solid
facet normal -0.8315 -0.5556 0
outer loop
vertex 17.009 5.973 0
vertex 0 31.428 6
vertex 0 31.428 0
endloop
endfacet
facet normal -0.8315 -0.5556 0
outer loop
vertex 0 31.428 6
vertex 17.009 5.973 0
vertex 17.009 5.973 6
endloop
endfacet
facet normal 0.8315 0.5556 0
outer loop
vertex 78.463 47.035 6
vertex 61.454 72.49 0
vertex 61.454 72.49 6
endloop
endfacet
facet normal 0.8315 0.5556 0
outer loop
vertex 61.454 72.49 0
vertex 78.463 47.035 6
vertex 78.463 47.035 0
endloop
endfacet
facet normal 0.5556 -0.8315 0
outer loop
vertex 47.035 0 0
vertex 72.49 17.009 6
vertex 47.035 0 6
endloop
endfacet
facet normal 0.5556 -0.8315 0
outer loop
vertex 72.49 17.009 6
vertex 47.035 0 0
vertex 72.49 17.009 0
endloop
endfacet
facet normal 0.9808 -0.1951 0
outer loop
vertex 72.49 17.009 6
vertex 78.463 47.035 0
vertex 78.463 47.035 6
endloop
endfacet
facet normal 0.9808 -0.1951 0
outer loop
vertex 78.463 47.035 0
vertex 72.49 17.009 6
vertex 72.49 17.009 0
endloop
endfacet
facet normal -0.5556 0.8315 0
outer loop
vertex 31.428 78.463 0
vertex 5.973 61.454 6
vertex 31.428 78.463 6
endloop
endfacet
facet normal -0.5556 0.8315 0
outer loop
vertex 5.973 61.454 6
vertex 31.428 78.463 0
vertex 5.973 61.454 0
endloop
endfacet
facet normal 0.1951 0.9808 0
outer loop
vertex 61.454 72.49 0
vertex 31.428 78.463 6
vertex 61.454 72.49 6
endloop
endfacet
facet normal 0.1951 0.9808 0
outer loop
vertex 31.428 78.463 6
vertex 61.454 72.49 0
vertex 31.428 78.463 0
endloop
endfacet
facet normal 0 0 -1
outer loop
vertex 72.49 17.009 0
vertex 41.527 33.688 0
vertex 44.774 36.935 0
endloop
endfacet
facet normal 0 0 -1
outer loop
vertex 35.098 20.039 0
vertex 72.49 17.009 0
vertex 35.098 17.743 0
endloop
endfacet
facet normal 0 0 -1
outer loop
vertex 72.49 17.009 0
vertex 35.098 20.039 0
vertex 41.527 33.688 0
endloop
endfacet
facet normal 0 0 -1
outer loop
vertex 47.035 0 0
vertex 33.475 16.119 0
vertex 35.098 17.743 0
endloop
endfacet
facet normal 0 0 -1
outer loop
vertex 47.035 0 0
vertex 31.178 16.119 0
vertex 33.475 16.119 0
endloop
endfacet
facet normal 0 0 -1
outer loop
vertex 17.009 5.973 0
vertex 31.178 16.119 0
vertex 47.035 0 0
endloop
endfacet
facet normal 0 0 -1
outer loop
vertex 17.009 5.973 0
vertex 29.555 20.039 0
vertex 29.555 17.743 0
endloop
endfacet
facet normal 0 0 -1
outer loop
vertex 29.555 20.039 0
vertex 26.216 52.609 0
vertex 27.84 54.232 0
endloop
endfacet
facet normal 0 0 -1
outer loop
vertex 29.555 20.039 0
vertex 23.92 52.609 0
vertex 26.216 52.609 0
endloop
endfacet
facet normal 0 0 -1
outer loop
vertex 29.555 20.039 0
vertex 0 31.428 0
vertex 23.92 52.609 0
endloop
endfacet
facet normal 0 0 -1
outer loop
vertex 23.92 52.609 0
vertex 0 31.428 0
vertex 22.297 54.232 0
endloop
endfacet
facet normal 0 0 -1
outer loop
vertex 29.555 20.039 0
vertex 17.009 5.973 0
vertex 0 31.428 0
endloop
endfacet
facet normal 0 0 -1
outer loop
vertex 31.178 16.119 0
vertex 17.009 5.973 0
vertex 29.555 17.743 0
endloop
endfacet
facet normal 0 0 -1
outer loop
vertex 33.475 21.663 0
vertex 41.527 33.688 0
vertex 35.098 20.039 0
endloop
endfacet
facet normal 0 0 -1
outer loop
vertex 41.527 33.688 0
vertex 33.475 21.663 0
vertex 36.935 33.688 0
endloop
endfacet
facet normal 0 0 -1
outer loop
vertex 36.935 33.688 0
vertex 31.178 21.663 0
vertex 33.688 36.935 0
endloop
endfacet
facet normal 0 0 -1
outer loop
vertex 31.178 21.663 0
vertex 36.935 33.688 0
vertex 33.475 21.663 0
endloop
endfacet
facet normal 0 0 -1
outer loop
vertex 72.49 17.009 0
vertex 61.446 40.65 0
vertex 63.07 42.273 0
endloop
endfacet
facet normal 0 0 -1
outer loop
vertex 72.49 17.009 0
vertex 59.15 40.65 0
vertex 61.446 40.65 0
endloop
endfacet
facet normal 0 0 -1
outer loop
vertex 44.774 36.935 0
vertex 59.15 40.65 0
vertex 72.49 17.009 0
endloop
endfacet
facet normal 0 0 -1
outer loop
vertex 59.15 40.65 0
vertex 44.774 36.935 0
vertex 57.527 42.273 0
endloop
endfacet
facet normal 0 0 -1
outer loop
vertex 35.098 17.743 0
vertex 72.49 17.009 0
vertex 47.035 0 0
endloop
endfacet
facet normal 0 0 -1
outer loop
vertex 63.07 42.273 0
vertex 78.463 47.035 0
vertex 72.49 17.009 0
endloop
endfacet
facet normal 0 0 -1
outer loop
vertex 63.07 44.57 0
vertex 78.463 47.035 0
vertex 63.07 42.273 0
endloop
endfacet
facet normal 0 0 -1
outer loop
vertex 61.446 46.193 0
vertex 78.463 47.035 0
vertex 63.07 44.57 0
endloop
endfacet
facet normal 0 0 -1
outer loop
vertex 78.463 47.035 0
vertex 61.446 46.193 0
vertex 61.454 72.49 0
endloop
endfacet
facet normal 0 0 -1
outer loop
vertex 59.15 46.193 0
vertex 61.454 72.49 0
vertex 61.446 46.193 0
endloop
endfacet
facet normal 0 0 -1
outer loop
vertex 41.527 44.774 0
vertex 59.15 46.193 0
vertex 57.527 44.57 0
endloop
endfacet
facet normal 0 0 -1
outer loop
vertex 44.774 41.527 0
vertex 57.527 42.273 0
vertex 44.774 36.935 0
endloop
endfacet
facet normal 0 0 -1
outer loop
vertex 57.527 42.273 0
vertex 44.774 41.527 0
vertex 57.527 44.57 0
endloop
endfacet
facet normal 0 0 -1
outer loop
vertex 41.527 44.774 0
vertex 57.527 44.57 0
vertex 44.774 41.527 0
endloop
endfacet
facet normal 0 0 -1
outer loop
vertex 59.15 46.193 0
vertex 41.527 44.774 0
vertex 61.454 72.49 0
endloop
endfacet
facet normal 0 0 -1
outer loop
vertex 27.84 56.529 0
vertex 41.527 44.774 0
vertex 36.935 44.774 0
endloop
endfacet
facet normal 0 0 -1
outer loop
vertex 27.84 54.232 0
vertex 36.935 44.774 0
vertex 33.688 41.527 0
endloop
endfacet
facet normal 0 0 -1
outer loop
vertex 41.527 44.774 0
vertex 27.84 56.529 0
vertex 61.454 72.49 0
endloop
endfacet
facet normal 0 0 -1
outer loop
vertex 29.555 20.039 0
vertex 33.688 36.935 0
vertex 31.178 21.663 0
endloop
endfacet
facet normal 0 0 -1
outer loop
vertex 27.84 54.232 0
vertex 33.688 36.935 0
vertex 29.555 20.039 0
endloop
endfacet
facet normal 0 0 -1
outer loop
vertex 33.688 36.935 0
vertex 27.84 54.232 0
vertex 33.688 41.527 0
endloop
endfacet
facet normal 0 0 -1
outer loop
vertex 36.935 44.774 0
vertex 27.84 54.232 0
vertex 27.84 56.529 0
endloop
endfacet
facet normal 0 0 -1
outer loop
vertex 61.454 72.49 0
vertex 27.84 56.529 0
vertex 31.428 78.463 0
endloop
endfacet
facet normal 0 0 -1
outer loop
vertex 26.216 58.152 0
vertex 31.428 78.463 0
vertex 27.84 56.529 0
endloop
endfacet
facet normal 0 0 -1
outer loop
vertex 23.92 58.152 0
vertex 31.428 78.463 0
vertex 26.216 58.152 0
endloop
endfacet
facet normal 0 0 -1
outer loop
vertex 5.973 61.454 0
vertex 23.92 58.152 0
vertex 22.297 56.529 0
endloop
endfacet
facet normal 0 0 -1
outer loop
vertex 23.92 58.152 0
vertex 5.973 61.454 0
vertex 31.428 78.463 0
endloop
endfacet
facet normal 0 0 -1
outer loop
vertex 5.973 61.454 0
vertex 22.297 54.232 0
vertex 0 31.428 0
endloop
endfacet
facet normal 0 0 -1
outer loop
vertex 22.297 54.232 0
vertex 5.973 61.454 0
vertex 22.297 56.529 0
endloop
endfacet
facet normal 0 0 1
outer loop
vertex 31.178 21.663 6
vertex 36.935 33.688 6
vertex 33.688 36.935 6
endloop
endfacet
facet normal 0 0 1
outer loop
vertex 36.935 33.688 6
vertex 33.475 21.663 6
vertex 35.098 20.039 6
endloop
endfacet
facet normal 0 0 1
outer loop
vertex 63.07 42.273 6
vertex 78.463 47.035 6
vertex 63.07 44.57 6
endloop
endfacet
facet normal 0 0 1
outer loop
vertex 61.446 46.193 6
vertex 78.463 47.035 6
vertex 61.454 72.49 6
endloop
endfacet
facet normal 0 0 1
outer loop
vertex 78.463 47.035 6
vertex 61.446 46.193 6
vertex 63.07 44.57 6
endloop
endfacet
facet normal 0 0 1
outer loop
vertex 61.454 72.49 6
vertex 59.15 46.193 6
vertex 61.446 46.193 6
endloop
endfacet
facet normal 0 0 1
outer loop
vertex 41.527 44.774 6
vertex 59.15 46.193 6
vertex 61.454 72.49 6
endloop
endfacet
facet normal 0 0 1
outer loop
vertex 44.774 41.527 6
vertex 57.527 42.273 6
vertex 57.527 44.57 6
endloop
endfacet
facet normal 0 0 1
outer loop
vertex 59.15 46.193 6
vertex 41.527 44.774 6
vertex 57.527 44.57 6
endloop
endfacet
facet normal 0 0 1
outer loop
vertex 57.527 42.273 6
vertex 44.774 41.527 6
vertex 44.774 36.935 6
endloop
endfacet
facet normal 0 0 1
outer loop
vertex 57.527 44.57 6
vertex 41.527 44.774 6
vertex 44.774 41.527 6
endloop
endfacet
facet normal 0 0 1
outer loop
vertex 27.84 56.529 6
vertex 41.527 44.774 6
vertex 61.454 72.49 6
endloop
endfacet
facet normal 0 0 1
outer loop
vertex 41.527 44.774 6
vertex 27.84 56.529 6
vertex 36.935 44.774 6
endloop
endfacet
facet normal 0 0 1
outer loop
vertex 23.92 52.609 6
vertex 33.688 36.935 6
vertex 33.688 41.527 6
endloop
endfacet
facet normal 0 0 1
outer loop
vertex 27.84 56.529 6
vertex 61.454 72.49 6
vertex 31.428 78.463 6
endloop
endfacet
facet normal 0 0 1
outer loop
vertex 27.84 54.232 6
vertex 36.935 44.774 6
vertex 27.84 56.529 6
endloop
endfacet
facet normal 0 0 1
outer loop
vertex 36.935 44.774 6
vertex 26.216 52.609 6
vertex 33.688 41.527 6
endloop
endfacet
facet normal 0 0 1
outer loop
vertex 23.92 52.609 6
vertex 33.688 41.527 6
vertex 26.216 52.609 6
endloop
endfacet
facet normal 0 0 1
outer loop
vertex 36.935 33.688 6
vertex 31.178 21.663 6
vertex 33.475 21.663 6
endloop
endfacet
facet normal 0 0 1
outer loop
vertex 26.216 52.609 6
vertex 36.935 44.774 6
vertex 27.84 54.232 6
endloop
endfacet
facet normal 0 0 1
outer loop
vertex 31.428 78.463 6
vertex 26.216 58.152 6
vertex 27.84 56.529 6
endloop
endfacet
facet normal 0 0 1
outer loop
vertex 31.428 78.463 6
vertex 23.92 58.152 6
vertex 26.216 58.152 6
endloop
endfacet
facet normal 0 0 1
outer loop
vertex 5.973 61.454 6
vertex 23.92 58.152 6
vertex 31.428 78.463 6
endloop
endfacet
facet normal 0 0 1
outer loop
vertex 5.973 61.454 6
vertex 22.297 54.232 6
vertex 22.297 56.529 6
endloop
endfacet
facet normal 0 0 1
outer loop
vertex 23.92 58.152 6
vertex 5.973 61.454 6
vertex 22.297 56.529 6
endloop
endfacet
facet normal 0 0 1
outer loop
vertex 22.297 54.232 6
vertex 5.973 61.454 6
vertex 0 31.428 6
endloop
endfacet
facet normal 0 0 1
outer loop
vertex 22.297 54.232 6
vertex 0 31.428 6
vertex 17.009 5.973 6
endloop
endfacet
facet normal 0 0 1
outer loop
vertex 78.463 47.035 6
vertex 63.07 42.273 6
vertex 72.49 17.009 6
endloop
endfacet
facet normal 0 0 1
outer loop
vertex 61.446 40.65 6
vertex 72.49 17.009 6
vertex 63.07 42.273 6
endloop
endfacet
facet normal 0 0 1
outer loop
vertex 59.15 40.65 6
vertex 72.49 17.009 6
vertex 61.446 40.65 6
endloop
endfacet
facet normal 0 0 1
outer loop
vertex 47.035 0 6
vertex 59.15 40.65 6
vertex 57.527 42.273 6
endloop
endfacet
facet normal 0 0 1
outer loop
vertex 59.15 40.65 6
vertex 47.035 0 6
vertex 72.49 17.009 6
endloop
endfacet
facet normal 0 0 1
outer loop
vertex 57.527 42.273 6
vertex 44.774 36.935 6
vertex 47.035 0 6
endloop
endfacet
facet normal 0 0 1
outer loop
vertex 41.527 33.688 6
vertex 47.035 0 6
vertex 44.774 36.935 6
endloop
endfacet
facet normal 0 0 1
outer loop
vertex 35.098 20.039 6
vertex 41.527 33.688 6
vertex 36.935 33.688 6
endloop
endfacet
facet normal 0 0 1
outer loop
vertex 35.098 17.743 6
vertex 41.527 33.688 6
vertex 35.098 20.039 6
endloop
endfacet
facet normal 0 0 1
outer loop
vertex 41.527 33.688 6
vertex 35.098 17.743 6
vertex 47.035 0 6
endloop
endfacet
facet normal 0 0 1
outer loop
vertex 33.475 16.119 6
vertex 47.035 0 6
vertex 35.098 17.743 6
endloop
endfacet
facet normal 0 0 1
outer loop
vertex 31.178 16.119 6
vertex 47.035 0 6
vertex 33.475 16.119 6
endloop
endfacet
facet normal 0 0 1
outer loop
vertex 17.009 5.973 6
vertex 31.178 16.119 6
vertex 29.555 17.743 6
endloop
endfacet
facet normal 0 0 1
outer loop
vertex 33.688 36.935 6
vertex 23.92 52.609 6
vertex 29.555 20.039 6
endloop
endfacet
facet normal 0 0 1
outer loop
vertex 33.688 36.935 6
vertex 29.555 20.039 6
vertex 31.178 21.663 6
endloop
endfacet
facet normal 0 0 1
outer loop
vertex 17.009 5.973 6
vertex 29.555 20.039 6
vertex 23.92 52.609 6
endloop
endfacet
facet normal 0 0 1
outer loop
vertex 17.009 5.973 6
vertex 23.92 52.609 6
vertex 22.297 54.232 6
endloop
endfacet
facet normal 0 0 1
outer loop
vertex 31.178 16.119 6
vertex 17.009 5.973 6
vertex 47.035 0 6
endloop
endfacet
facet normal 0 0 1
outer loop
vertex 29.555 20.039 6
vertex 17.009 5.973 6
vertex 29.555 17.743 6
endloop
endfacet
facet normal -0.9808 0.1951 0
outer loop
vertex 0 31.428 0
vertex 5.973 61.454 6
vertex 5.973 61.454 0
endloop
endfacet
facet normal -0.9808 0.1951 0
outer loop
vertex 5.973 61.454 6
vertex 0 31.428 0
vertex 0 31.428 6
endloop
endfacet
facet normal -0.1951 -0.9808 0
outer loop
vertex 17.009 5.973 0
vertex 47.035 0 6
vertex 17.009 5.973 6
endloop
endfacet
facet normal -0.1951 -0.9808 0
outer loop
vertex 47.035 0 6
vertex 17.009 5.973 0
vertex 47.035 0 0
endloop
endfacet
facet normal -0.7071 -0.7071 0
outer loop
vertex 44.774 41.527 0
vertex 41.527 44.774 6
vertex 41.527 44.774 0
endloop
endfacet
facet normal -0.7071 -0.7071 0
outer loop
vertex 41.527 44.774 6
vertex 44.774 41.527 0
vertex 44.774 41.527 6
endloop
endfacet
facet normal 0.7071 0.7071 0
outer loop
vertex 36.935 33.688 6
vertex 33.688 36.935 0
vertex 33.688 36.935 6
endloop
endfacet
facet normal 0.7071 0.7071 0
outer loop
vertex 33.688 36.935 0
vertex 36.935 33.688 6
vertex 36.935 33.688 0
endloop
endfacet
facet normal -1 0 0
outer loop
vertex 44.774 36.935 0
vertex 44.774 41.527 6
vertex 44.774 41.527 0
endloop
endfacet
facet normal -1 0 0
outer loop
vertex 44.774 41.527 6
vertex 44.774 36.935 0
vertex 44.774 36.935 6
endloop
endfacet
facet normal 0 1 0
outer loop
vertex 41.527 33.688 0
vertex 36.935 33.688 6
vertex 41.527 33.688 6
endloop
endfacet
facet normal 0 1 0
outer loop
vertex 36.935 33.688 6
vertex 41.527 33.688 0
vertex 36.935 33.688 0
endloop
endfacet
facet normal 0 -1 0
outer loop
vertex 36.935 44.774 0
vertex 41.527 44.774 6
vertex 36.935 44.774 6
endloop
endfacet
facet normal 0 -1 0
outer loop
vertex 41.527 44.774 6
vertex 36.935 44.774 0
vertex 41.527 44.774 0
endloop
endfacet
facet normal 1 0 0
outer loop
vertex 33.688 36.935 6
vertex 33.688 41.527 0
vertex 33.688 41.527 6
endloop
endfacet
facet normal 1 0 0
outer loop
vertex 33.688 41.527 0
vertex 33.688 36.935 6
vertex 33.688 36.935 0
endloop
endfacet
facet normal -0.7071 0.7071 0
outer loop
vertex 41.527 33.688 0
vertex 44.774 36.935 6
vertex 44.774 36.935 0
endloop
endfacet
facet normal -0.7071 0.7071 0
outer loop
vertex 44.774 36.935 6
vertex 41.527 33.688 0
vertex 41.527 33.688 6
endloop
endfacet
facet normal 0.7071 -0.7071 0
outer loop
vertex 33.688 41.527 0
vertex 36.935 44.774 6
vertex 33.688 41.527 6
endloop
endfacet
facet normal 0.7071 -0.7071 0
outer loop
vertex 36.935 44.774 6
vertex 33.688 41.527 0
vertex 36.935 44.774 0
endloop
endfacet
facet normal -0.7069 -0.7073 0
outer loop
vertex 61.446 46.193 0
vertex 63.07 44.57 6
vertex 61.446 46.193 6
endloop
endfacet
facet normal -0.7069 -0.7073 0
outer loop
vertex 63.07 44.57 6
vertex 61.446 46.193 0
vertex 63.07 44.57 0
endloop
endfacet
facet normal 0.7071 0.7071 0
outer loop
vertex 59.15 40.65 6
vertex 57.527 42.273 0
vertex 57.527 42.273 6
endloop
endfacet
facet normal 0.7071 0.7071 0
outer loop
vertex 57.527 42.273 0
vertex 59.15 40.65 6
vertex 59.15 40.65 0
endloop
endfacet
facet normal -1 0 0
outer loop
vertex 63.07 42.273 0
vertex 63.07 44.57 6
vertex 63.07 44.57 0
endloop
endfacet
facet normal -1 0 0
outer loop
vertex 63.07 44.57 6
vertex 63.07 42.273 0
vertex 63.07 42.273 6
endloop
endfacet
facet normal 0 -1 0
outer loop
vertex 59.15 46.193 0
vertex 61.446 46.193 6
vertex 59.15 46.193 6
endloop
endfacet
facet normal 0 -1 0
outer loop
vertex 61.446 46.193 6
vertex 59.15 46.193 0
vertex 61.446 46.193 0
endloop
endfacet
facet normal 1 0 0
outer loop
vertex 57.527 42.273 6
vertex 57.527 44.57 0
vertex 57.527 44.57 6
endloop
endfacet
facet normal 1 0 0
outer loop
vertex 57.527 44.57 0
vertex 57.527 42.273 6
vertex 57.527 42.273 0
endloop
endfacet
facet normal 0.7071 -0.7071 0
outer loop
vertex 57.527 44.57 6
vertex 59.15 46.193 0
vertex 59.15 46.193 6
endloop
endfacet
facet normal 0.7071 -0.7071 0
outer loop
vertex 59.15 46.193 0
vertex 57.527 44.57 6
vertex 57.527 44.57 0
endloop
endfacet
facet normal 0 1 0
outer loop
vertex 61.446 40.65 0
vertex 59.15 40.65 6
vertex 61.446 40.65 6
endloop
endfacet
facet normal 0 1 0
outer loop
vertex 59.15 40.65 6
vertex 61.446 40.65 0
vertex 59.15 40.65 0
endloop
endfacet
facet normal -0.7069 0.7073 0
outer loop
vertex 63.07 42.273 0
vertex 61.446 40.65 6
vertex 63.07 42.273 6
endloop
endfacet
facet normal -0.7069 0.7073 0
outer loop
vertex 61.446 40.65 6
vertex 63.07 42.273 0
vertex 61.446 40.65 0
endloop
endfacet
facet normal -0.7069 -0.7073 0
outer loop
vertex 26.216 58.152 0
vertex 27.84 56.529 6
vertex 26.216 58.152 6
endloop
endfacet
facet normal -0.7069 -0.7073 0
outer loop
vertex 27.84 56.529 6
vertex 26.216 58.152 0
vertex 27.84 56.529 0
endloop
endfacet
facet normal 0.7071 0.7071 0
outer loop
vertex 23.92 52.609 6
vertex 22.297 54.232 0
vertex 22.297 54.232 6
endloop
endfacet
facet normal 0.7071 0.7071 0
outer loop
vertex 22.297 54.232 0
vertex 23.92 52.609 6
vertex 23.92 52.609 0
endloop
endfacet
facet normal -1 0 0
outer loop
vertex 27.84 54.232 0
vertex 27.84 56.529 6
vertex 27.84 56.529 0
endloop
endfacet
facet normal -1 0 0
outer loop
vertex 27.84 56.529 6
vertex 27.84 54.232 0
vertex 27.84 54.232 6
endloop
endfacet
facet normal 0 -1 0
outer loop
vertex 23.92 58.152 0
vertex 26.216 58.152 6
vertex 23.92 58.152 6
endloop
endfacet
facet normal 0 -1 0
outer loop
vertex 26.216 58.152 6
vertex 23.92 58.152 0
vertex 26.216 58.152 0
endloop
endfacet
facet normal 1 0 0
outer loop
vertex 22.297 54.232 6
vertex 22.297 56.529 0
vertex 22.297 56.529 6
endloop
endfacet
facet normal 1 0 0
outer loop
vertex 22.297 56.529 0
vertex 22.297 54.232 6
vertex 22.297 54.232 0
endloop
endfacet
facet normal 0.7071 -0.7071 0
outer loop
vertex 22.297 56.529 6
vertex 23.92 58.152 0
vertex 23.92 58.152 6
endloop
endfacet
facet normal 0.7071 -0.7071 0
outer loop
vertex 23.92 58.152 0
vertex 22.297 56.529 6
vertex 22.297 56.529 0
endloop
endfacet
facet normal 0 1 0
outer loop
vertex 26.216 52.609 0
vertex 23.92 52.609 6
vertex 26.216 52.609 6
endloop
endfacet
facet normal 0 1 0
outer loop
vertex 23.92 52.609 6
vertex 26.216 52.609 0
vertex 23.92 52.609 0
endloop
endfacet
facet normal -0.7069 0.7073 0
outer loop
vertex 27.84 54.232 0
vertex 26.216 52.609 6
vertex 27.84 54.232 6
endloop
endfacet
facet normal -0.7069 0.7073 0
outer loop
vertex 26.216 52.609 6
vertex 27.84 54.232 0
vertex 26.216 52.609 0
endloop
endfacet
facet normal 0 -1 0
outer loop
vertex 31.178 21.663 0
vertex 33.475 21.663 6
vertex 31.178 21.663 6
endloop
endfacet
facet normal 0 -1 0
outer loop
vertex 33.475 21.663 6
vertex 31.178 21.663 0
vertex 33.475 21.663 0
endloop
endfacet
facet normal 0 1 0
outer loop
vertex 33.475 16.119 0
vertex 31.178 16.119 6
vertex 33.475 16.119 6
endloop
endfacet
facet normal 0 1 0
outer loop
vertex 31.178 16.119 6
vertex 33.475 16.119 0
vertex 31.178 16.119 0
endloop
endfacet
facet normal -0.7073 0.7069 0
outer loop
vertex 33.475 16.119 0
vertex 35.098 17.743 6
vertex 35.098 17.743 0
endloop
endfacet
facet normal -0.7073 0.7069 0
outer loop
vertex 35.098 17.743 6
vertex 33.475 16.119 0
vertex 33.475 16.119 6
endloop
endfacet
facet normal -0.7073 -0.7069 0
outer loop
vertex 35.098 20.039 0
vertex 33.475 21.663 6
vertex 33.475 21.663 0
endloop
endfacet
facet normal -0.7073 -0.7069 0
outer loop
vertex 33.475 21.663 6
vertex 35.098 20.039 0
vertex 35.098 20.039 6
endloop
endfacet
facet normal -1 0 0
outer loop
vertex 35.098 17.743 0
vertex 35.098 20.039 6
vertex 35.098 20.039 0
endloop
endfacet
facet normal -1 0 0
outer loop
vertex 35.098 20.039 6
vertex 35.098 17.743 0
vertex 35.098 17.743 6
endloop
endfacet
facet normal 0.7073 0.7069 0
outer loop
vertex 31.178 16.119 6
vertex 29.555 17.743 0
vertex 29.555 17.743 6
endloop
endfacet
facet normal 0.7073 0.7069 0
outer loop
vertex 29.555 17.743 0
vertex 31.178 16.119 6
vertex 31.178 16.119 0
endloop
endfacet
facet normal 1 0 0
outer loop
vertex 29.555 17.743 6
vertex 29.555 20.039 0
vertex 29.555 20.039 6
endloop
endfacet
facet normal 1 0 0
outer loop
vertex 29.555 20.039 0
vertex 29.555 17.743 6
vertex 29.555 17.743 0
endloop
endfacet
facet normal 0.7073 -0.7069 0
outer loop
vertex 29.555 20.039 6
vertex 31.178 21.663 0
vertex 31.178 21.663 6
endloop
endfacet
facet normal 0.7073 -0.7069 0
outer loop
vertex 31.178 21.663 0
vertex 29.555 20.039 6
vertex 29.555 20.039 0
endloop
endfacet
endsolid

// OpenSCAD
$fn = 32;

// ----------------------------------------------------------------------
// Polygon plate: 8-gon R40, 3 bolt windows
// ----------------------------------------------------------------------

// --- parameters (mm) ---
sides = 8;                // number of polygon sides
plate_r = 40;             // circumscribed radius of the polygon
bore_r = 6;               // centre bore radius
bolts = 3;                // number of bolt windows
ring_r = 21.48;           // bolt-circle radius
bolt_r = 3;               // bolt window radius
plate_t = 6;              // plate thickness, Z (extrusion height)

plate_d = 2 * plate_r;  // circumscribed diameter
bore_d = 2 * bore_r;  // centre bore diameter
bolt_d = 2 * bolt_r;  // bolt window diameter
ring_d = 2 * ring_r;  // bolt-circle diameter

profile = [[78.463, 47.035], [61.454, 72.49], [31.428, 78.463], [5.973, 61.454], [0, 31.428], [17.009, 5.973], [47.035, 0], [72.49, 17.009]];  // primary outline, 8 points, counter clockwise
void_1 = [[44.774, 41.527], [41.527, 44.774], [36.935, 44.774], [33.688, 41.527], [33.688, 36.935], [36.935, 33.688], [41.527, 33.688], [44.774, 36.935]];  // centre bore, 8 points
void_2 = [[63.07, 44.57], [61.446, 46.193], [59.15, 46.193], [57.527, 44.57], [57.527, 42.273], [59.15, 40.65], [61.446, 40.65], [63.07, 42.273]];  // bolt window 1, 8 points
void_3 = [[27.84, 56.529], [26.216, 58.152], [23.92, 58.152], [22.297, 56.529], [22.297, 54.232], [23.92, 52.609], [26.216, 52.609], [27.84, 54.232]];  // bolt window 2, 8 points
void_4 = [[35.098, 20.039], [33.475, 21.663], [31.178, 21.663], [29.555, 20.039], [29.555, 17.743], [31.178, 16.119], [33.475, 16.119], [35.098, 17.743]];  // bolt window 3, 8 points

// --- the one profile operation ---
difference() {
  linear_extrude(height = plate_t) polygon(points = profile);
  translate([0, 0, -1])
    linear_extrude(height = plate_t + 2) polygon(points = void_1);
  translate([0, 0, -1])
    linear_extrude(height = plate_t + 2) polygon(points = void_2);
  translate([0, 0, -1])
    linear_extrude(height = plate_t + 2) polygon(points = void_3);
  translate([0, 0, -1])
    linear_extrude(height = plate_t + 2) polygon(points = void_4);
}
